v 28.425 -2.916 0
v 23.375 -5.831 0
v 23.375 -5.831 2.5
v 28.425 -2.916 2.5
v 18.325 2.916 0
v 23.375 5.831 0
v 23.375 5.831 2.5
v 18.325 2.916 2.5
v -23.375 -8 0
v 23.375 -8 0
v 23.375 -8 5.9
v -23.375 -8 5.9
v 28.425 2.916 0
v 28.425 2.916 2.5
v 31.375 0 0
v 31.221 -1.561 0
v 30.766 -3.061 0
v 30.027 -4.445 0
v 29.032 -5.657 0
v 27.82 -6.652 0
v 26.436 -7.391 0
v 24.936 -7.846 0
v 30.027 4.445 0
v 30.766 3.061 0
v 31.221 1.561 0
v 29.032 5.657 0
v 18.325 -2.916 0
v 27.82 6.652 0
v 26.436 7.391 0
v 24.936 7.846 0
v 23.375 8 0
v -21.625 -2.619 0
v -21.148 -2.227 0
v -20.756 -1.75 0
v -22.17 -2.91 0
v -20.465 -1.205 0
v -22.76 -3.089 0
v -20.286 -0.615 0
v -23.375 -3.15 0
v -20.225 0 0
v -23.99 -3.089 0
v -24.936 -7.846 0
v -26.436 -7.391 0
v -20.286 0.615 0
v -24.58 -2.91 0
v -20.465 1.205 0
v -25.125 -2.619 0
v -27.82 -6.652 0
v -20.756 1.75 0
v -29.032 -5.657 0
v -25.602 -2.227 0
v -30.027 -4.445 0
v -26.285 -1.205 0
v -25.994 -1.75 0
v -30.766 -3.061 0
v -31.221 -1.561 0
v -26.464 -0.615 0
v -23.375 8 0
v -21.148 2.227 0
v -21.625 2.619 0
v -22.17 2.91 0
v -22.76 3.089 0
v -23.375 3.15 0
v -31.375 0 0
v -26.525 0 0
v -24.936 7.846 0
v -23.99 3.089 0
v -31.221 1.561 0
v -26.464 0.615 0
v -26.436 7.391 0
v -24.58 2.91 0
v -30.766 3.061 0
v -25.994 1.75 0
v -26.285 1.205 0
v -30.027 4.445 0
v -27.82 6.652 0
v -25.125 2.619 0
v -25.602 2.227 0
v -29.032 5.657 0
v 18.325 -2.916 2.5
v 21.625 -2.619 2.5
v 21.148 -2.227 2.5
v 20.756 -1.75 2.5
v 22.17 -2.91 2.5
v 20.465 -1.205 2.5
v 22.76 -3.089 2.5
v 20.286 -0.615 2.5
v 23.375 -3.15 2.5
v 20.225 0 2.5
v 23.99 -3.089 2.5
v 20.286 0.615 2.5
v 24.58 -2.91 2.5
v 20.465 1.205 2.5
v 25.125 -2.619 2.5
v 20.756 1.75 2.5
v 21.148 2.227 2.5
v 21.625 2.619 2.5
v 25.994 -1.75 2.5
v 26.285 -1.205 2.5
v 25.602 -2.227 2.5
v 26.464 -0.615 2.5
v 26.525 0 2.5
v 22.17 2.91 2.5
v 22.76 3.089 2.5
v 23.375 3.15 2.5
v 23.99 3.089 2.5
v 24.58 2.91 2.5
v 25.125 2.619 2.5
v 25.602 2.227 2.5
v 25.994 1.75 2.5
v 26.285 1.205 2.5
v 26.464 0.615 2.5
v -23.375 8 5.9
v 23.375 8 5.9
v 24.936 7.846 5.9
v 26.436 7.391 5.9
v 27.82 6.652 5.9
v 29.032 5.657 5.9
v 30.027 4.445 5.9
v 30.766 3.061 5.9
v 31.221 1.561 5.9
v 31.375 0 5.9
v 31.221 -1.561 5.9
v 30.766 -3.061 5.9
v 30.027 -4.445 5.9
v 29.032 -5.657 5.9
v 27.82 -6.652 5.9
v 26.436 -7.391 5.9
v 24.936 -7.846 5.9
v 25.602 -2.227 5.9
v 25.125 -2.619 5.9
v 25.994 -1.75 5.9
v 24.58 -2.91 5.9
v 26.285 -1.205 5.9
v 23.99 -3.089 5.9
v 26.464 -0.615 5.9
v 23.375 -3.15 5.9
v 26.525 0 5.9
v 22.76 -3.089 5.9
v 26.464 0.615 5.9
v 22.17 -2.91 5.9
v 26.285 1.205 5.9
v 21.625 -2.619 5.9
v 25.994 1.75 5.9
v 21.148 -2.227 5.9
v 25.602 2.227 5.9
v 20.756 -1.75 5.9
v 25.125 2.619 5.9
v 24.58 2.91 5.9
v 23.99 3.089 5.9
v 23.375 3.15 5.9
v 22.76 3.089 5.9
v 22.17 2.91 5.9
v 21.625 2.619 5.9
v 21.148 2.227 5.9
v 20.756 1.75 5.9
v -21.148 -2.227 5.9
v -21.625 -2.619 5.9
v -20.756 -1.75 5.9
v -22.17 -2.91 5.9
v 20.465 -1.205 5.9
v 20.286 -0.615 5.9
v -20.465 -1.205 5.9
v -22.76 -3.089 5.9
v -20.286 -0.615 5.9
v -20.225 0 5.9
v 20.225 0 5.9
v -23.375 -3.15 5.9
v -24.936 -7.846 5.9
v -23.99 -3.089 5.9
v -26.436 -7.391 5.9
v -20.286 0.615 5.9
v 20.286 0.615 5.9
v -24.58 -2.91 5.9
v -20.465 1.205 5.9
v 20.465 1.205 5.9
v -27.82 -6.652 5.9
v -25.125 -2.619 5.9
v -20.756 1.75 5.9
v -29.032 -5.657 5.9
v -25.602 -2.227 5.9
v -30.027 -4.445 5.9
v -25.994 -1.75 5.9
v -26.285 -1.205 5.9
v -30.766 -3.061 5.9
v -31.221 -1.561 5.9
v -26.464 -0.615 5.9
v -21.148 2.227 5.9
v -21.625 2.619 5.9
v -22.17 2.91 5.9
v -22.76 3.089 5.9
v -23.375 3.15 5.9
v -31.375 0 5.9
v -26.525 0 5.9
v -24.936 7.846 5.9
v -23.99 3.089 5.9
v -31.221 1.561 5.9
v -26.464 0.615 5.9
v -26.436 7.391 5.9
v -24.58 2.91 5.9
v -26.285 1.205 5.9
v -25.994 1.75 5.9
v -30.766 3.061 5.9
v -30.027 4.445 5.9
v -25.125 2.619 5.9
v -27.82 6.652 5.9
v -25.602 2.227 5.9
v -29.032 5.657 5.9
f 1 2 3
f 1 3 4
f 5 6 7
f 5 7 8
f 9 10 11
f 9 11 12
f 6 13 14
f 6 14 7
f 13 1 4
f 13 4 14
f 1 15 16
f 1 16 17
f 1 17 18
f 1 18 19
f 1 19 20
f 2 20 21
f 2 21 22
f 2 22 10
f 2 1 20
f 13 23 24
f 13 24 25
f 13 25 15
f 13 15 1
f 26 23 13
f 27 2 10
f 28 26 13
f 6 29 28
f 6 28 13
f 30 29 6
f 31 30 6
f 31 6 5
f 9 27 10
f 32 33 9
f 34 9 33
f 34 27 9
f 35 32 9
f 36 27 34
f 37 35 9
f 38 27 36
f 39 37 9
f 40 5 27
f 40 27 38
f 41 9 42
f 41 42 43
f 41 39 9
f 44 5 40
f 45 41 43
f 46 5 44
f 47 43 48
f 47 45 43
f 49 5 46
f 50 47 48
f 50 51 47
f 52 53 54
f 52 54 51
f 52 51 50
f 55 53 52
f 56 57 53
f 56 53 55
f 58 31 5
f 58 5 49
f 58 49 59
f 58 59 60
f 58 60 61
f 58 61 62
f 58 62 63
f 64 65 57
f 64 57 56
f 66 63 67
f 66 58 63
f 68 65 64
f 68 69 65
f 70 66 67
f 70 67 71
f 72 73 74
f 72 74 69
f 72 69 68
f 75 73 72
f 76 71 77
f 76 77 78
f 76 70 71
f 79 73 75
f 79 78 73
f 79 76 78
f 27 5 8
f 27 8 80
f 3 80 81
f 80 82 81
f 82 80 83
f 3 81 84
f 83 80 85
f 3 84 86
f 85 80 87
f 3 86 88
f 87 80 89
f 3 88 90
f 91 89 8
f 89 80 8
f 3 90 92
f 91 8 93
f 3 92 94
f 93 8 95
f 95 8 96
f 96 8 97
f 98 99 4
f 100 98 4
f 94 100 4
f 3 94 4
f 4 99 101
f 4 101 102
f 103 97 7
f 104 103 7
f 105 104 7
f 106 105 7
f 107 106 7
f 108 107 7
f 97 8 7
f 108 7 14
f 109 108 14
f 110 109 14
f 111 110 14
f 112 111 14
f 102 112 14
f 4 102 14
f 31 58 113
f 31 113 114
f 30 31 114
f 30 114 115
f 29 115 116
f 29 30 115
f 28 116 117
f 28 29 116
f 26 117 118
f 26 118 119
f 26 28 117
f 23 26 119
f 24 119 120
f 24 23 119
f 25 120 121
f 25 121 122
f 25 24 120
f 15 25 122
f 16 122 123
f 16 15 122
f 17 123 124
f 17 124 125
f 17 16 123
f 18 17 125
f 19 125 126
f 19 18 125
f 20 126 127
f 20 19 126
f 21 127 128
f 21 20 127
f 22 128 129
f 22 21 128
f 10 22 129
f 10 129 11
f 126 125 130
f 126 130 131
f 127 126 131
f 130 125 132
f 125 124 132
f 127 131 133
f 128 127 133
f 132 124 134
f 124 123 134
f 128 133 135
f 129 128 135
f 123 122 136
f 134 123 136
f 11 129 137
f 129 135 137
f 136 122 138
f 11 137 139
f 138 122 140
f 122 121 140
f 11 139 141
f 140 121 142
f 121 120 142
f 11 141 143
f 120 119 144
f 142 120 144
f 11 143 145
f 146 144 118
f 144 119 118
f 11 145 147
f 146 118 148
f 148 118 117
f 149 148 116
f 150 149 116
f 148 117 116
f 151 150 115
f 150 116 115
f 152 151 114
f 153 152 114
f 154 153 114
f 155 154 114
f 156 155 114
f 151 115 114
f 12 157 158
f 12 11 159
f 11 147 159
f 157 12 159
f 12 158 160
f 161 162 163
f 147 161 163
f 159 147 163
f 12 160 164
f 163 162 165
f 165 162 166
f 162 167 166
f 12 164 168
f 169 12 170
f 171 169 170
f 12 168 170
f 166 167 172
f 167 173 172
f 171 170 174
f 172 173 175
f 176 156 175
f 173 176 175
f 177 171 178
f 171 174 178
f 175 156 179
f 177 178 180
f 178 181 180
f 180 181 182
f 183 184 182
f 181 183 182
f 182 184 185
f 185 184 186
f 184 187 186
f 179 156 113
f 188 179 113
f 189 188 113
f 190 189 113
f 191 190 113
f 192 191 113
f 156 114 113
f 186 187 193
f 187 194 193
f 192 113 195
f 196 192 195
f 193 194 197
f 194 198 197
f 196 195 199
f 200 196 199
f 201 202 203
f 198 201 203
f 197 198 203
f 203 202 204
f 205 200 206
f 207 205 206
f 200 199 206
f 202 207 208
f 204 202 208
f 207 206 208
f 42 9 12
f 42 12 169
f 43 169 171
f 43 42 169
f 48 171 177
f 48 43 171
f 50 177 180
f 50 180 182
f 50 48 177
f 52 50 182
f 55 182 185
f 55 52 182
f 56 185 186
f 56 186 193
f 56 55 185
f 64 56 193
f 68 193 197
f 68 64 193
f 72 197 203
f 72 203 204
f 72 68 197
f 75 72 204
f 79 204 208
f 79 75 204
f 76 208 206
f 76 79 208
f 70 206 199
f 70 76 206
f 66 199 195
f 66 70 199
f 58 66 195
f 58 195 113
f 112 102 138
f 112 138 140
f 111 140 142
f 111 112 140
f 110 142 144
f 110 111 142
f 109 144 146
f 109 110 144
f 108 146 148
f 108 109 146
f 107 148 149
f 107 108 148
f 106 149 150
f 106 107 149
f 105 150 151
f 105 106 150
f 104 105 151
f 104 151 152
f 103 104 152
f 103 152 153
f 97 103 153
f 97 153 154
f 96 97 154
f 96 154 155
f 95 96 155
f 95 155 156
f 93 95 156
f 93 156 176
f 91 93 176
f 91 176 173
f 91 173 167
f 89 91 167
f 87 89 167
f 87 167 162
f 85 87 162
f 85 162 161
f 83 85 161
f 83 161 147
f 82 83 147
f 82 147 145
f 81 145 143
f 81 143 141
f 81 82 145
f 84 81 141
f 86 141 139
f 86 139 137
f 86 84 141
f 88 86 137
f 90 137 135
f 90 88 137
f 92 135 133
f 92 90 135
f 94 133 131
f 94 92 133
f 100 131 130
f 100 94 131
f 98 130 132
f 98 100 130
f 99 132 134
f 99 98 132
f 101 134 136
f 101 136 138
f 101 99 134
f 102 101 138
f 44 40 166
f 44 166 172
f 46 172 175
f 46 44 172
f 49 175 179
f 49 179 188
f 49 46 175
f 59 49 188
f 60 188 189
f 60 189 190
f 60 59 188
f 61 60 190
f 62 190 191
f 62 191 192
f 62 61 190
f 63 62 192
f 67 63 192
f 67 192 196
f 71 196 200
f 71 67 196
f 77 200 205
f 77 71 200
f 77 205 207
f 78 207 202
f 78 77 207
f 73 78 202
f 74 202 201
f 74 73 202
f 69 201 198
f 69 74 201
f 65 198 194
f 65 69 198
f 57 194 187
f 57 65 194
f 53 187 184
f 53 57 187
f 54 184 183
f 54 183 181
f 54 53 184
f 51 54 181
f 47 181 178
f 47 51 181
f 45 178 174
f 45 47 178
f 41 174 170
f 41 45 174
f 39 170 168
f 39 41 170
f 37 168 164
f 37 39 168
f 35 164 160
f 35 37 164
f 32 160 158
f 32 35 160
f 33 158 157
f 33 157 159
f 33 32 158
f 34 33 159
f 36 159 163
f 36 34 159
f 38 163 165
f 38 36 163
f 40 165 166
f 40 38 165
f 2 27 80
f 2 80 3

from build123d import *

# Parameters (mm, degrees)
SKETCH1_R           = 3.15
BOSS_EXTRUDE1_DEPTH = 5.9
CUT_EXTRUDE2_DEPTH  = 2.5


with BuildPart() as part:
    # Sketch1 → Boss-Extrude1 (new body)
    with BuildSketch(Plane.XY):
        with BuildLine():
            Line((23.375, -8), (-23.375, -8))
            ThreePointArc((-23.375, -8), (-31.375, 0), (-23.375, 8))
            Line((-23.375, 8), (23.375, 8))
            ThreePointArc((23.375, 8), (31.375, 0), (23.375, -8))
        make_face()
        with Locations((23.375, 0)):
            Circle(SKETCH1_R, mode=Mode.SUBTRACT)
        with Locations((-23.375, 0)):
            Circle(SKETCH1_R, mode=Mode.SUBTRACT)
    extrude(amount=BOSS_EXTRUDE1_DEPTH)

    # Sketch2 → Cut-Extrude2 (cut)
    with BuildSketch(Plane.XY):
        Polygon((23.375, 5.831237719), (18.325, 2.915618859), (18.325, -2.915618859), (23.375, -5.831237719), (28.425, -2.915618859), (28.425, 2.915618859), align=None)
    extrude(amount=CUT_EXTRUDE2_DEPTH, mode=Mode.SUBTRACT)


solid = part.part
